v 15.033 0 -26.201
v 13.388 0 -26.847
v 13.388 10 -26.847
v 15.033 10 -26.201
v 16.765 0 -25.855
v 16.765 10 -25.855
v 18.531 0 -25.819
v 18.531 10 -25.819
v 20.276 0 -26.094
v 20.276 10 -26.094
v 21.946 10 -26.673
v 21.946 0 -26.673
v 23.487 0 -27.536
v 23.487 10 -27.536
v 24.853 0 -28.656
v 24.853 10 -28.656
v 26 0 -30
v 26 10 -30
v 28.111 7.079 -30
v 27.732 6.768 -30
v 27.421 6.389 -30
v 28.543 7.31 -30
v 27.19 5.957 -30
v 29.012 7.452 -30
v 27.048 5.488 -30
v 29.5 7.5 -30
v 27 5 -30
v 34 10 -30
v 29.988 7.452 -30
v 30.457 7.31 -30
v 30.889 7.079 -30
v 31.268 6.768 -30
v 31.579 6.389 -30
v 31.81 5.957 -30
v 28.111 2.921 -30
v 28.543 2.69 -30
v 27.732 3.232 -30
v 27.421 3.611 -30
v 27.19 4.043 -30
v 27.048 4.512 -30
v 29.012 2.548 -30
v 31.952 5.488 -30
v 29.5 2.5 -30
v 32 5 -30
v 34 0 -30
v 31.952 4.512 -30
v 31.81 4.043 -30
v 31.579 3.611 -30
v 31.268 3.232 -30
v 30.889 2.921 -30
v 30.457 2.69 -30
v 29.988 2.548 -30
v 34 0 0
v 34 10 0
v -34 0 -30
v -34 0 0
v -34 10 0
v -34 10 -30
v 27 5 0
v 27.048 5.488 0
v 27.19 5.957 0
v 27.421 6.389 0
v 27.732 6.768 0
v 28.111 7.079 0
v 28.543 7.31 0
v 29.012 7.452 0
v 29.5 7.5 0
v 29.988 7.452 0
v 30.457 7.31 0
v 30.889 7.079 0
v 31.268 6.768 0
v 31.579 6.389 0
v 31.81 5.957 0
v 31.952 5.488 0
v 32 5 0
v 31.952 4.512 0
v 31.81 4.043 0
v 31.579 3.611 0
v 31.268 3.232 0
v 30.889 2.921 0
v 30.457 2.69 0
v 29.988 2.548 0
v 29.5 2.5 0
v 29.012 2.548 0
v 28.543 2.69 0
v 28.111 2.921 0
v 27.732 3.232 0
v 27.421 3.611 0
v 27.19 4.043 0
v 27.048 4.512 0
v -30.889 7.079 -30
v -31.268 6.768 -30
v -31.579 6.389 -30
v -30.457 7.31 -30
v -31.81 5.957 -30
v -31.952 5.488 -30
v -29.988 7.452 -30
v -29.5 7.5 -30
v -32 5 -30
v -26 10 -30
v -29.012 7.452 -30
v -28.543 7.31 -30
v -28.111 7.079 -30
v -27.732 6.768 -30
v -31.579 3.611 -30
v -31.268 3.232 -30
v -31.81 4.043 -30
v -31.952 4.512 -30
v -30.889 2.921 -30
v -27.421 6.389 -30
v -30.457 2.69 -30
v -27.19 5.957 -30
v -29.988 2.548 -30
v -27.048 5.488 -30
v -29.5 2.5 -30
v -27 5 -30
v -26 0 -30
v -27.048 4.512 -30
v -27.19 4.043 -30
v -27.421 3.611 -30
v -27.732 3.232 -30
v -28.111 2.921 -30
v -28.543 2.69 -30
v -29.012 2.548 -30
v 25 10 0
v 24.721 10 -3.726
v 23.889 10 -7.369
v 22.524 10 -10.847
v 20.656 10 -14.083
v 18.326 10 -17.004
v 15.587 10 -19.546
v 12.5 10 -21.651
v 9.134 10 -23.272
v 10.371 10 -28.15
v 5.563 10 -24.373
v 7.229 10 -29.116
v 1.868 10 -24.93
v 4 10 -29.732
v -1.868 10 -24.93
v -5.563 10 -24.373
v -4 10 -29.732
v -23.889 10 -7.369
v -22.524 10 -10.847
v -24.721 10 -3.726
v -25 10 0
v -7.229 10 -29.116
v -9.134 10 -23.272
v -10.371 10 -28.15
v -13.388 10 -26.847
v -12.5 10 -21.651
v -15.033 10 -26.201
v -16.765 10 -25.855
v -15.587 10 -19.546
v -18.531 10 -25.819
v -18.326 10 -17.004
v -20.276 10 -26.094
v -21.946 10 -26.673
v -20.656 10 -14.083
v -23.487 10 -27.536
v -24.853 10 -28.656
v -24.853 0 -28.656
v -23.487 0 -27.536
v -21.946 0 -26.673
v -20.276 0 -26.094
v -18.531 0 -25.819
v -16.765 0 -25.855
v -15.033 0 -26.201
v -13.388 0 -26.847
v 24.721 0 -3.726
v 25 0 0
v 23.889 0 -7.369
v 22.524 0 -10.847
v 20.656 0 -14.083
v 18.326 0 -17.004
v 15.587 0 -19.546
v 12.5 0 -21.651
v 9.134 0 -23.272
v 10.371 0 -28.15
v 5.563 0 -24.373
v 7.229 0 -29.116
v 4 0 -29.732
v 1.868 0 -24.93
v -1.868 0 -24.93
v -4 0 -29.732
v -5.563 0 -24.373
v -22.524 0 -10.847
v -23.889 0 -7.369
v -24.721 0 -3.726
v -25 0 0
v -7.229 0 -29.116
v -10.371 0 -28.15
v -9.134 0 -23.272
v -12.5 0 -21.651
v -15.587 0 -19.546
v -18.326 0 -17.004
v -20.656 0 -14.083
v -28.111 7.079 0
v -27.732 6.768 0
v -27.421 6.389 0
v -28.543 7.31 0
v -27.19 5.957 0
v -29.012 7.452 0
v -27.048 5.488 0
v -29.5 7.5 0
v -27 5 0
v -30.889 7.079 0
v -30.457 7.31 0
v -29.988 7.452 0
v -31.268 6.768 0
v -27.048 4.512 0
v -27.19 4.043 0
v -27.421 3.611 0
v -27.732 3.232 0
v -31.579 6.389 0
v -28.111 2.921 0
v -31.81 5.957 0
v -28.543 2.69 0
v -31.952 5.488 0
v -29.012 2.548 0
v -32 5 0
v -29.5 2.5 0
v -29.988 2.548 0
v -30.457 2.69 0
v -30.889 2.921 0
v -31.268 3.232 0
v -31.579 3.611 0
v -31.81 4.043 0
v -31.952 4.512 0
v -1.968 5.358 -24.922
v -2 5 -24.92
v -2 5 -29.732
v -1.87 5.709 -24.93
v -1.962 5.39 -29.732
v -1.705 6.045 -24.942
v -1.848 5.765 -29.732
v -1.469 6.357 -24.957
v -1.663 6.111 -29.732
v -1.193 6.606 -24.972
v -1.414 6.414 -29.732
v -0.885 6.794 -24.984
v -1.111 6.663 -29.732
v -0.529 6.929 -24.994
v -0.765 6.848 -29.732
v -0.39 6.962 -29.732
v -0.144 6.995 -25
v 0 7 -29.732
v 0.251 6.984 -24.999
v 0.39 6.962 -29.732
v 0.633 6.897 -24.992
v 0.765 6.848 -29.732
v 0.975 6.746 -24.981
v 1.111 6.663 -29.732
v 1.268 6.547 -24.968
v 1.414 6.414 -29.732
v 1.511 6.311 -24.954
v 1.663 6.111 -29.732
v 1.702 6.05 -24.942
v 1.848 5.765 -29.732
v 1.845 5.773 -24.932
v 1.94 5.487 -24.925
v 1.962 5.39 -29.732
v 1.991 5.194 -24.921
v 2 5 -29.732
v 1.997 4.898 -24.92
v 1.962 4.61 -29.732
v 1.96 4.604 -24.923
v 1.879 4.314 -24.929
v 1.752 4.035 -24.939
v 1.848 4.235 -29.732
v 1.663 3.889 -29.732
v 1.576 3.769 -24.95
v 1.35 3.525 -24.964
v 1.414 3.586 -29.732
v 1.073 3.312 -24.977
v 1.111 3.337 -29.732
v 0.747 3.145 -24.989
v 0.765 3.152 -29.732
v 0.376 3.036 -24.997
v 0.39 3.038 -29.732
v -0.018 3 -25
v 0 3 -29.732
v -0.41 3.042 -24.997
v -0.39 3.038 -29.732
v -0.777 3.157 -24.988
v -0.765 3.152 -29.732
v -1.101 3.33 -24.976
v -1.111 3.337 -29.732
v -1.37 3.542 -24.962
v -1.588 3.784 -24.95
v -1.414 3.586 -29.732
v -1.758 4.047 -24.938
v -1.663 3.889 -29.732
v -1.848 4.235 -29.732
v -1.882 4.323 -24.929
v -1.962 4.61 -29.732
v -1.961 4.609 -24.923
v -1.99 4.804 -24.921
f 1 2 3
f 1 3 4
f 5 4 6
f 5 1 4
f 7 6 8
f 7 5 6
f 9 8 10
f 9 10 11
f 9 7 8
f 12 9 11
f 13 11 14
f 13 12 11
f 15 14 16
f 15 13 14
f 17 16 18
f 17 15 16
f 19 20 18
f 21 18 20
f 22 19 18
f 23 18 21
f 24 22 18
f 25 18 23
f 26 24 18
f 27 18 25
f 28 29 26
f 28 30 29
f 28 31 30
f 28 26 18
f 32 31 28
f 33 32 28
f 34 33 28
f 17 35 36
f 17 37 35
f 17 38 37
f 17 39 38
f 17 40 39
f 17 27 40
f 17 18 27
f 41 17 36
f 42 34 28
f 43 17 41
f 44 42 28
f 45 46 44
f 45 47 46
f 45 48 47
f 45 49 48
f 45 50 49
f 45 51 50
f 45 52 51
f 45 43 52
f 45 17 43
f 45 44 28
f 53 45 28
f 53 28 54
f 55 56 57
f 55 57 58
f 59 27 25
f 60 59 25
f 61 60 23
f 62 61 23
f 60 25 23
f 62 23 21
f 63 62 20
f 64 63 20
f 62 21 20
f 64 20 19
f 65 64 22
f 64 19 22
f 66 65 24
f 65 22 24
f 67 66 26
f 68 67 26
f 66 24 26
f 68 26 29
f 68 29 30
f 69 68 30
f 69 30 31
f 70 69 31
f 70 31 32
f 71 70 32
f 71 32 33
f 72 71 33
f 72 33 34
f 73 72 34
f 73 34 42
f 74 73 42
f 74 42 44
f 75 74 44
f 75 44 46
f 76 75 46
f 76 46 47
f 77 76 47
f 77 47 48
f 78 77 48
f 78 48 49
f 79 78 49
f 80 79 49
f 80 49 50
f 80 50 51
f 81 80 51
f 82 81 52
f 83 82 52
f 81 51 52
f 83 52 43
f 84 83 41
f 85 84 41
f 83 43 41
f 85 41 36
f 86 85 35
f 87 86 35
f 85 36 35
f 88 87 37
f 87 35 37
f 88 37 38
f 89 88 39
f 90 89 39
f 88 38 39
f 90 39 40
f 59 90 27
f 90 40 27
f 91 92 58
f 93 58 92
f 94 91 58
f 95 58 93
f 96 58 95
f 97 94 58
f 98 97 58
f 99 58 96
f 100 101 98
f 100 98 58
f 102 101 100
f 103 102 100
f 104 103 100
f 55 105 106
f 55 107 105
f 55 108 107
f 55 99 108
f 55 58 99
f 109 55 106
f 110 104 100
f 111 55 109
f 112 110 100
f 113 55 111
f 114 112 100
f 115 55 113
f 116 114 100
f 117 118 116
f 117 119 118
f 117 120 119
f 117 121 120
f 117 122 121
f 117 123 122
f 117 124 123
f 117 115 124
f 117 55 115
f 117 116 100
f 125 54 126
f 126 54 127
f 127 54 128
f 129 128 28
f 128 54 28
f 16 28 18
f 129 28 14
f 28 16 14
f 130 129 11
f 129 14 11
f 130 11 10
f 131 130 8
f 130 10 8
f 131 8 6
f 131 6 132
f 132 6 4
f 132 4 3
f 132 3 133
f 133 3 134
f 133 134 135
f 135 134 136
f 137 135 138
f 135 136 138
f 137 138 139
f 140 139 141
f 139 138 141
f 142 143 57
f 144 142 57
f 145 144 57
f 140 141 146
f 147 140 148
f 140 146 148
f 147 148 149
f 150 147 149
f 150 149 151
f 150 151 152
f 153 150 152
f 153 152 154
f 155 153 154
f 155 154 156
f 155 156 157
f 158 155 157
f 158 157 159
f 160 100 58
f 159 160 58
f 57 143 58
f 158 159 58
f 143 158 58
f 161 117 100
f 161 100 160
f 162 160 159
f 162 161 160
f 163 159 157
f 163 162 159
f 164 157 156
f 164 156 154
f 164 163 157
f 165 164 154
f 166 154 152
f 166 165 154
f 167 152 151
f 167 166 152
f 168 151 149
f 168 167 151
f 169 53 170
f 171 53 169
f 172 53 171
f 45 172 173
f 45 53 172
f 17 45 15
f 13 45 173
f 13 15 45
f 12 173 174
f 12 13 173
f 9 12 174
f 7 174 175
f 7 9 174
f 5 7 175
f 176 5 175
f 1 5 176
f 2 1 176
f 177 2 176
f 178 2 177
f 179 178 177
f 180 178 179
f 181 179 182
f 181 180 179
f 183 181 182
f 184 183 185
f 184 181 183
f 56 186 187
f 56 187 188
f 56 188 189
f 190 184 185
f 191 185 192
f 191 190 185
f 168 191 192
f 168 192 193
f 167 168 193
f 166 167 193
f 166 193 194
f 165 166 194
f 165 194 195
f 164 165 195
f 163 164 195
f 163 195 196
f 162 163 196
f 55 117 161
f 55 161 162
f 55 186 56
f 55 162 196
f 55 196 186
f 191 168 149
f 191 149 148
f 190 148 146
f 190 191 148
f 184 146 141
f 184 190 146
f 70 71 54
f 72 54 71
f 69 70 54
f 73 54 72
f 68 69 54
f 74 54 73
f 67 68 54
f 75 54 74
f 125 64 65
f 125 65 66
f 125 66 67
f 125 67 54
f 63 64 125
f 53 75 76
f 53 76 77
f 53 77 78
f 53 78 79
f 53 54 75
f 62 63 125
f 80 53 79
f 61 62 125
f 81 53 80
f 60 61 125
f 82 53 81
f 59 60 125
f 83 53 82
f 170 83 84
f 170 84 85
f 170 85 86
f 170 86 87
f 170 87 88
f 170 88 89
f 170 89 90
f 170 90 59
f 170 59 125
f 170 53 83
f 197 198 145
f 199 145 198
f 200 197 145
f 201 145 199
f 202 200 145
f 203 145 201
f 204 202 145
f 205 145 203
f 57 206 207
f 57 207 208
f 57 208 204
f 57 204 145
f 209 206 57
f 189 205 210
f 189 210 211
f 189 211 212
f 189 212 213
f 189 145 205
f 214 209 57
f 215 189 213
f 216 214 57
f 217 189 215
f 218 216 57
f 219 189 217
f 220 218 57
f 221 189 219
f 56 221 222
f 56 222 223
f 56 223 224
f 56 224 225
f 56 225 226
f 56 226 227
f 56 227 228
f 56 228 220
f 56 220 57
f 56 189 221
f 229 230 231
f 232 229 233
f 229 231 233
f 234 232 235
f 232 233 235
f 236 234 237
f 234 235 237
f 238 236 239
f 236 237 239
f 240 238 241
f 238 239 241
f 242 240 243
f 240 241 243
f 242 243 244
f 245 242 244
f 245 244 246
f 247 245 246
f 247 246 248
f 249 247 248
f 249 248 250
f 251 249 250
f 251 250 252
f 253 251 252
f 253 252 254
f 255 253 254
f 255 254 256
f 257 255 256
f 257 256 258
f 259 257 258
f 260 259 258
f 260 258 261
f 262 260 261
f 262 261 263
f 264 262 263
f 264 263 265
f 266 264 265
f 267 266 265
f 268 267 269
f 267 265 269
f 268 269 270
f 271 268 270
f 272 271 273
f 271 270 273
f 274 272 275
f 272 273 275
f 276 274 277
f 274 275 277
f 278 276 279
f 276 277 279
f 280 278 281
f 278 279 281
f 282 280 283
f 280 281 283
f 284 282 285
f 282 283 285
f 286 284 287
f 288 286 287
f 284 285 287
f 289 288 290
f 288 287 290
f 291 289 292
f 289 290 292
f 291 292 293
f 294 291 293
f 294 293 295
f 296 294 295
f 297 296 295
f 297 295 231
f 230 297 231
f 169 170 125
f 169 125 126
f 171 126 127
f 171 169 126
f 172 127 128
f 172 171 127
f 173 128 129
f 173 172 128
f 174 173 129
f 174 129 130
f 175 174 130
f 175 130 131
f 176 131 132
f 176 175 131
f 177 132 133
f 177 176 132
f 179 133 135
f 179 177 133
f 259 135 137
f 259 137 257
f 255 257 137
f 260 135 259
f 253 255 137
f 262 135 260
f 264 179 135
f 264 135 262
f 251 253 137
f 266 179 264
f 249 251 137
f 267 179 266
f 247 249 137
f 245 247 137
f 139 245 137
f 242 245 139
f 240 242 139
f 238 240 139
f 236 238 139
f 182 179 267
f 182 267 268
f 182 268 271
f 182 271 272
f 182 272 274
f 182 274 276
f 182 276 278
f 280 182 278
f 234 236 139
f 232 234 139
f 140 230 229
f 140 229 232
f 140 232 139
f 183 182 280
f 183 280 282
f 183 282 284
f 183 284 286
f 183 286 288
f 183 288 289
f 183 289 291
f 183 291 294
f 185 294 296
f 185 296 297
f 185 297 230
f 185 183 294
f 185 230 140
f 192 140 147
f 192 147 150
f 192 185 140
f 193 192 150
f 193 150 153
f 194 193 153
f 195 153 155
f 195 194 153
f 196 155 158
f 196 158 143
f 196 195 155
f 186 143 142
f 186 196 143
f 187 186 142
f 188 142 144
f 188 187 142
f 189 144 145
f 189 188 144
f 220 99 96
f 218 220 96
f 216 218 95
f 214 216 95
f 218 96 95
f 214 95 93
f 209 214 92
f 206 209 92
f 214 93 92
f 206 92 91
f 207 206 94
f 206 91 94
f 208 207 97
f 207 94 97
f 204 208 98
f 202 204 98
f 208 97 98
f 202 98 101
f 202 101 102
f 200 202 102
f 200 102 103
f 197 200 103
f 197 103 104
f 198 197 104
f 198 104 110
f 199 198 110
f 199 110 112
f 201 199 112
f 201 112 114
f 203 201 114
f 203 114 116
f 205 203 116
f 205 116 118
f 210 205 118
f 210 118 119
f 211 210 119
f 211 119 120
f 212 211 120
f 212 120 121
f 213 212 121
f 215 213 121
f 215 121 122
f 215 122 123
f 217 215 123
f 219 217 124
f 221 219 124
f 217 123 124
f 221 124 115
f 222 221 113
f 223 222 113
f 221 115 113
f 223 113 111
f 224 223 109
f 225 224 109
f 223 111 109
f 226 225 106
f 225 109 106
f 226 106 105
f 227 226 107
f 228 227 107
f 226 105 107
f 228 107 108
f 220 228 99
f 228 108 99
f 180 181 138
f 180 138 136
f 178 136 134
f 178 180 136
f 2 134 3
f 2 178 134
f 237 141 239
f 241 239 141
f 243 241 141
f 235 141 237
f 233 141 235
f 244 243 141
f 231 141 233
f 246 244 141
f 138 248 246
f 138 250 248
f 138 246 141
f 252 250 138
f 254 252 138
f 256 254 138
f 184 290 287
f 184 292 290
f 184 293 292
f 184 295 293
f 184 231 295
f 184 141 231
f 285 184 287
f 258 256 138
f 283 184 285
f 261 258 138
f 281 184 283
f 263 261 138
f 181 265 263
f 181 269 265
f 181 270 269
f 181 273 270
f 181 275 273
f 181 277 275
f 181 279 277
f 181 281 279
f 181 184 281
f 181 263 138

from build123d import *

# Parameters (mm, degrees)
EXTRUDE_1_DEPTH     = 10
SKETCH_2_R          = 2.5
SKETCH_2_R_2        = 2
CUT_EXTRUDE_1_DEPTH = 40


with BuildPart() as part:
    # 草图1 → 凸台-拉伸1 (new body)
    with BuildSketch(Plane(origin=(0, 0, 0), x_dir=(1, 0, 0), z_dir=(0, 1, 0))):
        with BuildLine():
            Line((-25, 0), (-34, 0))
            Line((-34, 0), (-34, 30))
            Line((-34, 30), (-26, 30))
            ThreePointArc((-26, 30), (-20.276357576, 26.094481357), (-13.388178788, 26.846911717))
            ThreePointArc((-13.388178788, 26.846911717), (-8.812963312, 28.676326084), (-4, 29.732137495))
            Line((-4, 29.732137495), (4, 29.732137495))
            ThreePointArc((4, 29.732137495), (8.812963312, 28.676326084), (13.388178788, 26.846911717))
            ThreePointArc((13.388178788, 26.846911717), (20.276357576, 26.094481357), (26, 30))
            Line((26, 30), (34, 30))
            Line((34, 30), (34, 0))
            Line((34, 0), (25, 0))
            ThreePointArc((25, 0), (0, 25), (-25, 0))
        make_face()
    extrude(amount=EXTRUDE_1_DEPTH)

    # 草图2 → 切除-拉伸1 (cut)
    with BuildSketch(Plane(origin=(0, 0, -30), x_dir=(-1, 0, 0), z_dir=(0, 0, -1))):
        with Locations((-29.5, 5)):
            Circle(SKETCH_2_R)
        with Locations((29.5, 5)):
            Circle(SKETCH_2_R)
        with Locations((0, 5)):
            Circle(SKETCH_2_R_2)
    extrude(amount=-CUT_EXTRUDE_1_DEPTH, mode=Mode.SUBTRACT)


solid = part.part
